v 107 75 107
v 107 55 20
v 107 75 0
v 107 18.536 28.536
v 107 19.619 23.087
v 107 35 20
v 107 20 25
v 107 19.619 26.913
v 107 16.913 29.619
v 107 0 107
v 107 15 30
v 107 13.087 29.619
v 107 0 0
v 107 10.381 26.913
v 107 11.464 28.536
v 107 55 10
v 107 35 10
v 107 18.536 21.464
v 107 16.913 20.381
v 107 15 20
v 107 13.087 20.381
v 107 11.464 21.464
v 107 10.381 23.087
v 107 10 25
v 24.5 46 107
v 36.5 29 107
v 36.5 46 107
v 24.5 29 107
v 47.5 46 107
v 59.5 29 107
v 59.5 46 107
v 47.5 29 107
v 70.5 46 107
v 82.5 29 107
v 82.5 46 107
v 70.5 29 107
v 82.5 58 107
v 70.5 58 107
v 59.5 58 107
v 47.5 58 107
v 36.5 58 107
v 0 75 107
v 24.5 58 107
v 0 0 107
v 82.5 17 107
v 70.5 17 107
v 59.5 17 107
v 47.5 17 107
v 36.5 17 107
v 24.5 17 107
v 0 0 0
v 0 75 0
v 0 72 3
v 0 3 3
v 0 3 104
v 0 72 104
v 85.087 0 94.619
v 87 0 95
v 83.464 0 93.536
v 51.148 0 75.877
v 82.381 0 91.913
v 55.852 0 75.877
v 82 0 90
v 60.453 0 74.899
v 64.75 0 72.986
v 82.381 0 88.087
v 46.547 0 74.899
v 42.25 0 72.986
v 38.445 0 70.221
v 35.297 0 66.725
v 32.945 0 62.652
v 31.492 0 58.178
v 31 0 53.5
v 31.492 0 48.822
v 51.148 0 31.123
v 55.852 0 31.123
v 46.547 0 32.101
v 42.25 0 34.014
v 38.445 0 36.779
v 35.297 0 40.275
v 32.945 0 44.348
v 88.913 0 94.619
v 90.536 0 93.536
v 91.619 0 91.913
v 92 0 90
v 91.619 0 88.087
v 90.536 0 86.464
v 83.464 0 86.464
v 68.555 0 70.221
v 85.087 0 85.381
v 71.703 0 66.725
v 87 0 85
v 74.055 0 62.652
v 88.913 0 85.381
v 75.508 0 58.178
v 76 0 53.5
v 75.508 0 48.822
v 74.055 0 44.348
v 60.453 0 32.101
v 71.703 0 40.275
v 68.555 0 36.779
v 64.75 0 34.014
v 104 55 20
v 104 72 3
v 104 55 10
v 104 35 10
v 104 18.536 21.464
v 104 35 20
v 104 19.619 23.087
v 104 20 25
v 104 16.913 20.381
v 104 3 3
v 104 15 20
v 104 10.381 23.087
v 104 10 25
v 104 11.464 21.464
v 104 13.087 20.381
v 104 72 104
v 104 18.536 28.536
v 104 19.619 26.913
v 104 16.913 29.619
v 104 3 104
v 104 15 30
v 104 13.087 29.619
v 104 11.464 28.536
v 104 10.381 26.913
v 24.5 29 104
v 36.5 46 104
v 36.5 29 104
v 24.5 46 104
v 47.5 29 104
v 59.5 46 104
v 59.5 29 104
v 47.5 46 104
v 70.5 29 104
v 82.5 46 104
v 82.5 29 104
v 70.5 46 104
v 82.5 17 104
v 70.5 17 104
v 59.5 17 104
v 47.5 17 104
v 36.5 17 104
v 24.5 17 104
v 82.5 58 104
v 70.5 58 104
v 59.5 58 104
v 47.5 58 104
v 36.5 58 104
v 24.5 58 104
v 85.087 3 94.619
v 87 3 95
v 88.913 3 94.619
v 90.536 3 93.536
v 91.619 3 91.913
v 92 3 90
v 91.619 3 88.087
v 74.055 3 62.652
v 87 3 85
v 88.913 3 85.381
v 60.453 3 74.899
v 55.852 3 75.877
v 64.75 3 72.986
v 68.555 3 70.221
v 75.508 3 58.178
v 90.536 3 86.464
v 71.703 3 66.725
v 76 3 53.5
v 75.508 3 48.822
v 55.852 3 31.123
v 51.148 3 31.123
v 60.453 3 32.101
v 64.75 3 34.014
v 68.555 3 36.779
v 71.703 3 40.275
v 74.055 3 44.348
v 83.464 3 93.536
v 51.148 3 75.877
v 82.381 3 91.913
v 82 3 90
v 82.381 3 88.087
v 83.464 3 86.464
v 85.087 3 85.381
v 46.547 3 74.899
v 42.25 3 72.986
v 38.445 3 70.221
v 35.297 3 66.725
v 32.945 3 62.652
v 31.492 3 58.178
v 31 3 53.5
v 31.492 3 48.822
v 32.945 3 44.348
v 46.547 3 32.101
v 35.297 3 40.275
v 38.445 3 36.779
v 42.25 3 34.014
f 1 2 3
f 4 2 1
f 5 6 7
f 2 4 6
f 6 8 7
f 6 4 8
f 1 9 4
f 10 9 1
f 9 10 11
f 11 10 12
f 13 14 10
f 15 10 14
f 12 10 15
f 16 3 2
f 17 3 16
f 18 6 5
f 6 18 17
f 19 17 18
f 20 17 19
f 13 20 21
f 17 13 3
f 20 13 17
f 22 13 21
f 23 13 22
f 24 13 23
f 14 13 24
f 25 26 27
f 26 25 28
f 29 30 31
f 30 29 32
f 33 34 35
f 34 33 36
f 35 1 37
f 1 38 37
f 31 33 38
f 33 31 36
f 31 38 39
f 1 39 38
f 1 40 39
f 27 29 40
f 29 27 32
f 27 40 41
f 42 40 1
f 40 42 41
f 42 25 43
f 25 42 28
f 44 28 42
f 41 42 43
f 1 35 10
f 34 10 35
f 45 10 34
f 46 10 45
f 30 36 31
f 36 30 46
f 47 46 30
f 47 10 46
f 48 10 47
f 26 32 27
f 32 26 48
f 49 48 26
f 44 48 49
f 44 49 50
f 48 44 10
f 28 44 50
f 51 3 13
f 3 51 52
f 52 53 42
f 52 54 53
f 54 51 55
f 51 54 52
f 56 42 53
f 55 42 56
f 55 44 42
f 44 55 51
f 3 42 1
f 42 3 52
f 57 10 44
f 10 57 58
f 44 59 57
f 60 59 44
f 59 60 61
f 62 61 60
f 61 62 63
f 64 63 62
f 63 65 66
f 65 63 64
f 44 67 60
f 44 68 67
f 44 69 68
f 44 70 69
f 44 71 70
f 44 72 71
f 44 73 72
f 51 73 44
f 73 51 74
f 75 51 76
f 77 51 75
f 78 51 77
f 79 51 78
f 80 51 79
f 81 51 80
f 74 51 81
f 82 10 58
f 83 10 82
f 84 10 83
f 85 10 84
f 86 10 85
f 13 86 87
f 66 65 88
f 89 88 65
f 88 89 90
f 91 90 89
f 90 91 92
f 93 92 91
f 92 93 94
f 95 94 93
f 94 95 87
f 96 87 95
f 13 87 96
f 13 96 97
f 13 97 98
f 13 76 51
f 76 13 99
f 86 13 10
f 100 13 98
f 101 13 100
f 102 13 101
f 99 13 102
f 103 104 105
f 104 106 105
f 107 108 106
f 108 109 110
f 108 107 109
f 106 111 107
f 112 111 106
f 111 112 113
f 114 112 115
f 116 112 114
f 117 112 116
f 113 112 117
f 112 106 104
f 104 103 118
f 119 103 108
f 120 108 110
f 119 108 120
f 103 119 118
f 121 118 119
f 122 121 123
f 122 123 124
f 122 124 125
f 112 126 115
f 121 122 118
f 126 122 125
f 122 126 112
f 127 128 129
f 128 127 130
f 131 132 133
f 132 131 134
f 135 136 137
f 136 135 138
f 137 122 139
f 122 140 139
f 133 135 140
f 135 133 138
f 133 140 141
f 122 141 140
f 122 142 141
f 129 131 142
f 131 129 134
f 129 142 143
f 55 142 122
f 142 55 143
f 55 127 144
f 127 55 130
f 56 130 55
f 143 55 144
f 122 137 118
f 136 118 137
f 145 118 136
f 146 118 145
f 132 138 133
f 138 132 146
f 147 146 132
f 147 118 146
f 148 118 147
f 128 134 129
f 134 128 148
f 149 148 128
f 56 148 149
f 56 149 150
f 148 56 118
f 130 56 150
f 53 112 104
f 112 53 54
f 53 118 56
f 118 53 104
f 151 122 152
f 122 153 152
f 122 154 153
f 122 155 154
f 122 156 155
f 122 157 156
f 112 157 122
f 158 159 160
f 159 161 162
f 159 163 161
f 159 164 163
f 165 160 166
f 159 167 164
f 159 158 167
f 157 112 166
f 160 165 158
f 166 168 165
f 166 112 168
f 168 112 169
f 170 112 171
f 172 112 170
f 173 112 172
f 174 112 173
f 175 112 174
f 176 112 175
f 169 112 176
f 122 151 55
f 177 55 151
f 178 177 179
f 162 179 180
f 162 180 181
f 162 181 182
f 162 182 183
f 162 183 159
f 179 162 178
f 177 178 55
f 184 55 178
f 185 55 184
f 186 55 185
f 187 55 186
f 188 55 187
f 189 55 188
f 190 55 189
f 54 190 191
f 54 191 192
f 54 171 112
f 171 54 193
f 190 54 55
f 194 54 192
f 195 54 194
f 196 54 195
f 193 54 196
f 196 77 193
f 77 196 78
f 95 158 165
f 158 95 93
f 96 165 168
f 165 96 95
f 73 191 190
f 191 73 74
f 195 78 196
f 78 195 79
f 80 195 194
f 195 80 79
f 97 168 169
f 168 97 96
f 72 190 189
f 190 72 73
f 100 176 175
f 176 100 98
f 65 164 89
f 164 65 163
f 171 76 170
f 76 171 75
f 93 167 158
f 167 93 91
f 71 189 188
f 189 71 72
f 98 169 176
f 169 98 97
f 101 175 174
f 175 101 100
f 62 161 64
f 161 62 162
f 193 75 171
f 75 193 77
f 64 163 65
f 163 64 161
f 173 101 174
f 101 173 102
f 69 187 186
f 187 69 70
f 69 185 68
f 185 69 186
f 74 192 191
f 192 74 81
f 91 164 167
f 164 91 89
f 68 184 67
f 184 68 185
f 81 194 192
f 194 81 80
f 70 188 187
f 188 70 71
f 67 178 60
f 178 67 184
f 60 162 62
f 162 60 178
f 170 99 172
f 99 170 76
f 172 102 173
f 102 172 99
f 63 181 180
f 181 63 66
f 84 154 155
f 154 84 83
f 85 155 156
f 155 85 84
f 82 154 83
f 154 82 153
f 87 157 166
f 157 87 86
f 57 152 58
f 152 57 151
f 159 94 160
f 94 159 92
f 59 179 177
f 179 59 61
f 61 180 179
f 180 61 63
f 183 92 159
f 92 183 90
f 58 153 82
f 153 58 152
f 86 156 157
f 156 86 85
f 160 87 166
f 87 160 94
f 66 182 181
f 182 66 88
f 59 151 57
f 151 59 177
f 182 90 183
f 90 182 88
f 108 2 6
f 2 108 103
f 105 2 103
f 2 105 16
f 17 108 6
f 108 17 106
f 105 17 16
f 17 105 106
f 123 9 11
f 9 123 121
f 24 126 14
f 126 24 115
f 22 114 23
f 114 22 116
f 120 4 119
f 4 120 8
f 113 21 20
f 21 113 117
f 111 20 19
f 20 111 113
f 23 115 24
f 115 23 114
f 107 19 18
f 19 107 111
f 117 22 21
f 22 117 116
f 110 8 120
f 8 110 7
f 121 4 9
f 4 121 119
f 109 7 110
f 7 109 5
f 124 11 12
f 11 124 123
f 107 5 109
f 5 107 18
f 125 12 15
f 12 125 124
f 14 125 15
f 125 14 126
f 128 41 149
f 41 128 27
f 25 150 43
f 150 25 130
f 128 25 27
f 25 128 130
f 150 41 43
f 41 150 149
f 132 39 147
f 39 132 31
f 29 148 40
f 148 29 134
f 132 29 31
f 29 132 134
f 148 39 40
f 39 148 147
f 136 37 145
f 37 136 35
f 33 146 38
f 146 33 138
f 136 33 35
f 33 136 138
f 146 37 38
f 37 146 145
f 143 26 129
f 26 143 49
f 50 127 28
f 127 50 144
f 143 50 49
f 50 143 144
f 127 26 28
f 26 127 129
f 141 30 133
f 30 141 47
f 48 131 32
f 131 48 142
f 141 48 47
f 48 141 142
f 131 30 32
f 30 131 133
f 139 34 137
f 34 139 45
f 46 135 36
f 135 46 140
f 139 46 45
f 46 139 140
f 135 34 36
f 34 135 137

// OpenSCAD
difference() {
    // make the cube hollow
    cube([107, 75, 107]);
    translate([3, 3, 3]) {
#        cube([101, 69, 101]);
    }
    // substract the left side (will be printed separetely)
    translate([0, 3, 3]) {
#        cube([3, 69, 101]);
    }
    // speaker
    translate([53.5, 3, 53.5]) {
        rotate([90,0,0]) {
#            cylinder(h = 3, r = 22.5);
        }
    }
    // volume stick
    translate([87, 3, 90]) {
        rotate([90,0,0]) {
#            cylinder(h = 3, r = 5);
        }
    }
    // Atmel programmer
    translate([107, 35, 10]) {
        rotate([0,0,90]) {
#            cube([20, 3, 10]);
        }
    }
    // power supply
    translate([104, 15, 25]) {
        rotate([0,90,0]) {
#            cylinder(h = 3, r = 5);
        }
    }
        
    // Button 1
    translate([24.5, 46, 107]) {
        rotate([0,90,0]) {
#            cube([3, 12, 12]);
        }
    }
    // Button 2
    translate([47.5, 46, 107]) {
        rotate([0,90,0]) {
#            cube([3, 12, 12]);
        }
    }
   
    // Button 3
    translate([70.5, 46, 107]) {
        rotate([0,90,0]) {
#            cube([3, 12, 12]);
        }
    }
    
    // Button 4
    translate([24.5, 17, 107]) {
        rotate([0,90,0]) {
#            cube([3, 12, 12]);
        }
    }
    
    // Button 5
    translate([47.5, 17, 107]) {
        rotate([0,90,0]) {
#            cube([3, 12, 12]);
        }
    }
        
    // Button 6
    translate([70.5, 17, 107]) {
        rotate([0,90,0]) {
#            cube([3, 12, 12]);
        }
    }      
}
    
